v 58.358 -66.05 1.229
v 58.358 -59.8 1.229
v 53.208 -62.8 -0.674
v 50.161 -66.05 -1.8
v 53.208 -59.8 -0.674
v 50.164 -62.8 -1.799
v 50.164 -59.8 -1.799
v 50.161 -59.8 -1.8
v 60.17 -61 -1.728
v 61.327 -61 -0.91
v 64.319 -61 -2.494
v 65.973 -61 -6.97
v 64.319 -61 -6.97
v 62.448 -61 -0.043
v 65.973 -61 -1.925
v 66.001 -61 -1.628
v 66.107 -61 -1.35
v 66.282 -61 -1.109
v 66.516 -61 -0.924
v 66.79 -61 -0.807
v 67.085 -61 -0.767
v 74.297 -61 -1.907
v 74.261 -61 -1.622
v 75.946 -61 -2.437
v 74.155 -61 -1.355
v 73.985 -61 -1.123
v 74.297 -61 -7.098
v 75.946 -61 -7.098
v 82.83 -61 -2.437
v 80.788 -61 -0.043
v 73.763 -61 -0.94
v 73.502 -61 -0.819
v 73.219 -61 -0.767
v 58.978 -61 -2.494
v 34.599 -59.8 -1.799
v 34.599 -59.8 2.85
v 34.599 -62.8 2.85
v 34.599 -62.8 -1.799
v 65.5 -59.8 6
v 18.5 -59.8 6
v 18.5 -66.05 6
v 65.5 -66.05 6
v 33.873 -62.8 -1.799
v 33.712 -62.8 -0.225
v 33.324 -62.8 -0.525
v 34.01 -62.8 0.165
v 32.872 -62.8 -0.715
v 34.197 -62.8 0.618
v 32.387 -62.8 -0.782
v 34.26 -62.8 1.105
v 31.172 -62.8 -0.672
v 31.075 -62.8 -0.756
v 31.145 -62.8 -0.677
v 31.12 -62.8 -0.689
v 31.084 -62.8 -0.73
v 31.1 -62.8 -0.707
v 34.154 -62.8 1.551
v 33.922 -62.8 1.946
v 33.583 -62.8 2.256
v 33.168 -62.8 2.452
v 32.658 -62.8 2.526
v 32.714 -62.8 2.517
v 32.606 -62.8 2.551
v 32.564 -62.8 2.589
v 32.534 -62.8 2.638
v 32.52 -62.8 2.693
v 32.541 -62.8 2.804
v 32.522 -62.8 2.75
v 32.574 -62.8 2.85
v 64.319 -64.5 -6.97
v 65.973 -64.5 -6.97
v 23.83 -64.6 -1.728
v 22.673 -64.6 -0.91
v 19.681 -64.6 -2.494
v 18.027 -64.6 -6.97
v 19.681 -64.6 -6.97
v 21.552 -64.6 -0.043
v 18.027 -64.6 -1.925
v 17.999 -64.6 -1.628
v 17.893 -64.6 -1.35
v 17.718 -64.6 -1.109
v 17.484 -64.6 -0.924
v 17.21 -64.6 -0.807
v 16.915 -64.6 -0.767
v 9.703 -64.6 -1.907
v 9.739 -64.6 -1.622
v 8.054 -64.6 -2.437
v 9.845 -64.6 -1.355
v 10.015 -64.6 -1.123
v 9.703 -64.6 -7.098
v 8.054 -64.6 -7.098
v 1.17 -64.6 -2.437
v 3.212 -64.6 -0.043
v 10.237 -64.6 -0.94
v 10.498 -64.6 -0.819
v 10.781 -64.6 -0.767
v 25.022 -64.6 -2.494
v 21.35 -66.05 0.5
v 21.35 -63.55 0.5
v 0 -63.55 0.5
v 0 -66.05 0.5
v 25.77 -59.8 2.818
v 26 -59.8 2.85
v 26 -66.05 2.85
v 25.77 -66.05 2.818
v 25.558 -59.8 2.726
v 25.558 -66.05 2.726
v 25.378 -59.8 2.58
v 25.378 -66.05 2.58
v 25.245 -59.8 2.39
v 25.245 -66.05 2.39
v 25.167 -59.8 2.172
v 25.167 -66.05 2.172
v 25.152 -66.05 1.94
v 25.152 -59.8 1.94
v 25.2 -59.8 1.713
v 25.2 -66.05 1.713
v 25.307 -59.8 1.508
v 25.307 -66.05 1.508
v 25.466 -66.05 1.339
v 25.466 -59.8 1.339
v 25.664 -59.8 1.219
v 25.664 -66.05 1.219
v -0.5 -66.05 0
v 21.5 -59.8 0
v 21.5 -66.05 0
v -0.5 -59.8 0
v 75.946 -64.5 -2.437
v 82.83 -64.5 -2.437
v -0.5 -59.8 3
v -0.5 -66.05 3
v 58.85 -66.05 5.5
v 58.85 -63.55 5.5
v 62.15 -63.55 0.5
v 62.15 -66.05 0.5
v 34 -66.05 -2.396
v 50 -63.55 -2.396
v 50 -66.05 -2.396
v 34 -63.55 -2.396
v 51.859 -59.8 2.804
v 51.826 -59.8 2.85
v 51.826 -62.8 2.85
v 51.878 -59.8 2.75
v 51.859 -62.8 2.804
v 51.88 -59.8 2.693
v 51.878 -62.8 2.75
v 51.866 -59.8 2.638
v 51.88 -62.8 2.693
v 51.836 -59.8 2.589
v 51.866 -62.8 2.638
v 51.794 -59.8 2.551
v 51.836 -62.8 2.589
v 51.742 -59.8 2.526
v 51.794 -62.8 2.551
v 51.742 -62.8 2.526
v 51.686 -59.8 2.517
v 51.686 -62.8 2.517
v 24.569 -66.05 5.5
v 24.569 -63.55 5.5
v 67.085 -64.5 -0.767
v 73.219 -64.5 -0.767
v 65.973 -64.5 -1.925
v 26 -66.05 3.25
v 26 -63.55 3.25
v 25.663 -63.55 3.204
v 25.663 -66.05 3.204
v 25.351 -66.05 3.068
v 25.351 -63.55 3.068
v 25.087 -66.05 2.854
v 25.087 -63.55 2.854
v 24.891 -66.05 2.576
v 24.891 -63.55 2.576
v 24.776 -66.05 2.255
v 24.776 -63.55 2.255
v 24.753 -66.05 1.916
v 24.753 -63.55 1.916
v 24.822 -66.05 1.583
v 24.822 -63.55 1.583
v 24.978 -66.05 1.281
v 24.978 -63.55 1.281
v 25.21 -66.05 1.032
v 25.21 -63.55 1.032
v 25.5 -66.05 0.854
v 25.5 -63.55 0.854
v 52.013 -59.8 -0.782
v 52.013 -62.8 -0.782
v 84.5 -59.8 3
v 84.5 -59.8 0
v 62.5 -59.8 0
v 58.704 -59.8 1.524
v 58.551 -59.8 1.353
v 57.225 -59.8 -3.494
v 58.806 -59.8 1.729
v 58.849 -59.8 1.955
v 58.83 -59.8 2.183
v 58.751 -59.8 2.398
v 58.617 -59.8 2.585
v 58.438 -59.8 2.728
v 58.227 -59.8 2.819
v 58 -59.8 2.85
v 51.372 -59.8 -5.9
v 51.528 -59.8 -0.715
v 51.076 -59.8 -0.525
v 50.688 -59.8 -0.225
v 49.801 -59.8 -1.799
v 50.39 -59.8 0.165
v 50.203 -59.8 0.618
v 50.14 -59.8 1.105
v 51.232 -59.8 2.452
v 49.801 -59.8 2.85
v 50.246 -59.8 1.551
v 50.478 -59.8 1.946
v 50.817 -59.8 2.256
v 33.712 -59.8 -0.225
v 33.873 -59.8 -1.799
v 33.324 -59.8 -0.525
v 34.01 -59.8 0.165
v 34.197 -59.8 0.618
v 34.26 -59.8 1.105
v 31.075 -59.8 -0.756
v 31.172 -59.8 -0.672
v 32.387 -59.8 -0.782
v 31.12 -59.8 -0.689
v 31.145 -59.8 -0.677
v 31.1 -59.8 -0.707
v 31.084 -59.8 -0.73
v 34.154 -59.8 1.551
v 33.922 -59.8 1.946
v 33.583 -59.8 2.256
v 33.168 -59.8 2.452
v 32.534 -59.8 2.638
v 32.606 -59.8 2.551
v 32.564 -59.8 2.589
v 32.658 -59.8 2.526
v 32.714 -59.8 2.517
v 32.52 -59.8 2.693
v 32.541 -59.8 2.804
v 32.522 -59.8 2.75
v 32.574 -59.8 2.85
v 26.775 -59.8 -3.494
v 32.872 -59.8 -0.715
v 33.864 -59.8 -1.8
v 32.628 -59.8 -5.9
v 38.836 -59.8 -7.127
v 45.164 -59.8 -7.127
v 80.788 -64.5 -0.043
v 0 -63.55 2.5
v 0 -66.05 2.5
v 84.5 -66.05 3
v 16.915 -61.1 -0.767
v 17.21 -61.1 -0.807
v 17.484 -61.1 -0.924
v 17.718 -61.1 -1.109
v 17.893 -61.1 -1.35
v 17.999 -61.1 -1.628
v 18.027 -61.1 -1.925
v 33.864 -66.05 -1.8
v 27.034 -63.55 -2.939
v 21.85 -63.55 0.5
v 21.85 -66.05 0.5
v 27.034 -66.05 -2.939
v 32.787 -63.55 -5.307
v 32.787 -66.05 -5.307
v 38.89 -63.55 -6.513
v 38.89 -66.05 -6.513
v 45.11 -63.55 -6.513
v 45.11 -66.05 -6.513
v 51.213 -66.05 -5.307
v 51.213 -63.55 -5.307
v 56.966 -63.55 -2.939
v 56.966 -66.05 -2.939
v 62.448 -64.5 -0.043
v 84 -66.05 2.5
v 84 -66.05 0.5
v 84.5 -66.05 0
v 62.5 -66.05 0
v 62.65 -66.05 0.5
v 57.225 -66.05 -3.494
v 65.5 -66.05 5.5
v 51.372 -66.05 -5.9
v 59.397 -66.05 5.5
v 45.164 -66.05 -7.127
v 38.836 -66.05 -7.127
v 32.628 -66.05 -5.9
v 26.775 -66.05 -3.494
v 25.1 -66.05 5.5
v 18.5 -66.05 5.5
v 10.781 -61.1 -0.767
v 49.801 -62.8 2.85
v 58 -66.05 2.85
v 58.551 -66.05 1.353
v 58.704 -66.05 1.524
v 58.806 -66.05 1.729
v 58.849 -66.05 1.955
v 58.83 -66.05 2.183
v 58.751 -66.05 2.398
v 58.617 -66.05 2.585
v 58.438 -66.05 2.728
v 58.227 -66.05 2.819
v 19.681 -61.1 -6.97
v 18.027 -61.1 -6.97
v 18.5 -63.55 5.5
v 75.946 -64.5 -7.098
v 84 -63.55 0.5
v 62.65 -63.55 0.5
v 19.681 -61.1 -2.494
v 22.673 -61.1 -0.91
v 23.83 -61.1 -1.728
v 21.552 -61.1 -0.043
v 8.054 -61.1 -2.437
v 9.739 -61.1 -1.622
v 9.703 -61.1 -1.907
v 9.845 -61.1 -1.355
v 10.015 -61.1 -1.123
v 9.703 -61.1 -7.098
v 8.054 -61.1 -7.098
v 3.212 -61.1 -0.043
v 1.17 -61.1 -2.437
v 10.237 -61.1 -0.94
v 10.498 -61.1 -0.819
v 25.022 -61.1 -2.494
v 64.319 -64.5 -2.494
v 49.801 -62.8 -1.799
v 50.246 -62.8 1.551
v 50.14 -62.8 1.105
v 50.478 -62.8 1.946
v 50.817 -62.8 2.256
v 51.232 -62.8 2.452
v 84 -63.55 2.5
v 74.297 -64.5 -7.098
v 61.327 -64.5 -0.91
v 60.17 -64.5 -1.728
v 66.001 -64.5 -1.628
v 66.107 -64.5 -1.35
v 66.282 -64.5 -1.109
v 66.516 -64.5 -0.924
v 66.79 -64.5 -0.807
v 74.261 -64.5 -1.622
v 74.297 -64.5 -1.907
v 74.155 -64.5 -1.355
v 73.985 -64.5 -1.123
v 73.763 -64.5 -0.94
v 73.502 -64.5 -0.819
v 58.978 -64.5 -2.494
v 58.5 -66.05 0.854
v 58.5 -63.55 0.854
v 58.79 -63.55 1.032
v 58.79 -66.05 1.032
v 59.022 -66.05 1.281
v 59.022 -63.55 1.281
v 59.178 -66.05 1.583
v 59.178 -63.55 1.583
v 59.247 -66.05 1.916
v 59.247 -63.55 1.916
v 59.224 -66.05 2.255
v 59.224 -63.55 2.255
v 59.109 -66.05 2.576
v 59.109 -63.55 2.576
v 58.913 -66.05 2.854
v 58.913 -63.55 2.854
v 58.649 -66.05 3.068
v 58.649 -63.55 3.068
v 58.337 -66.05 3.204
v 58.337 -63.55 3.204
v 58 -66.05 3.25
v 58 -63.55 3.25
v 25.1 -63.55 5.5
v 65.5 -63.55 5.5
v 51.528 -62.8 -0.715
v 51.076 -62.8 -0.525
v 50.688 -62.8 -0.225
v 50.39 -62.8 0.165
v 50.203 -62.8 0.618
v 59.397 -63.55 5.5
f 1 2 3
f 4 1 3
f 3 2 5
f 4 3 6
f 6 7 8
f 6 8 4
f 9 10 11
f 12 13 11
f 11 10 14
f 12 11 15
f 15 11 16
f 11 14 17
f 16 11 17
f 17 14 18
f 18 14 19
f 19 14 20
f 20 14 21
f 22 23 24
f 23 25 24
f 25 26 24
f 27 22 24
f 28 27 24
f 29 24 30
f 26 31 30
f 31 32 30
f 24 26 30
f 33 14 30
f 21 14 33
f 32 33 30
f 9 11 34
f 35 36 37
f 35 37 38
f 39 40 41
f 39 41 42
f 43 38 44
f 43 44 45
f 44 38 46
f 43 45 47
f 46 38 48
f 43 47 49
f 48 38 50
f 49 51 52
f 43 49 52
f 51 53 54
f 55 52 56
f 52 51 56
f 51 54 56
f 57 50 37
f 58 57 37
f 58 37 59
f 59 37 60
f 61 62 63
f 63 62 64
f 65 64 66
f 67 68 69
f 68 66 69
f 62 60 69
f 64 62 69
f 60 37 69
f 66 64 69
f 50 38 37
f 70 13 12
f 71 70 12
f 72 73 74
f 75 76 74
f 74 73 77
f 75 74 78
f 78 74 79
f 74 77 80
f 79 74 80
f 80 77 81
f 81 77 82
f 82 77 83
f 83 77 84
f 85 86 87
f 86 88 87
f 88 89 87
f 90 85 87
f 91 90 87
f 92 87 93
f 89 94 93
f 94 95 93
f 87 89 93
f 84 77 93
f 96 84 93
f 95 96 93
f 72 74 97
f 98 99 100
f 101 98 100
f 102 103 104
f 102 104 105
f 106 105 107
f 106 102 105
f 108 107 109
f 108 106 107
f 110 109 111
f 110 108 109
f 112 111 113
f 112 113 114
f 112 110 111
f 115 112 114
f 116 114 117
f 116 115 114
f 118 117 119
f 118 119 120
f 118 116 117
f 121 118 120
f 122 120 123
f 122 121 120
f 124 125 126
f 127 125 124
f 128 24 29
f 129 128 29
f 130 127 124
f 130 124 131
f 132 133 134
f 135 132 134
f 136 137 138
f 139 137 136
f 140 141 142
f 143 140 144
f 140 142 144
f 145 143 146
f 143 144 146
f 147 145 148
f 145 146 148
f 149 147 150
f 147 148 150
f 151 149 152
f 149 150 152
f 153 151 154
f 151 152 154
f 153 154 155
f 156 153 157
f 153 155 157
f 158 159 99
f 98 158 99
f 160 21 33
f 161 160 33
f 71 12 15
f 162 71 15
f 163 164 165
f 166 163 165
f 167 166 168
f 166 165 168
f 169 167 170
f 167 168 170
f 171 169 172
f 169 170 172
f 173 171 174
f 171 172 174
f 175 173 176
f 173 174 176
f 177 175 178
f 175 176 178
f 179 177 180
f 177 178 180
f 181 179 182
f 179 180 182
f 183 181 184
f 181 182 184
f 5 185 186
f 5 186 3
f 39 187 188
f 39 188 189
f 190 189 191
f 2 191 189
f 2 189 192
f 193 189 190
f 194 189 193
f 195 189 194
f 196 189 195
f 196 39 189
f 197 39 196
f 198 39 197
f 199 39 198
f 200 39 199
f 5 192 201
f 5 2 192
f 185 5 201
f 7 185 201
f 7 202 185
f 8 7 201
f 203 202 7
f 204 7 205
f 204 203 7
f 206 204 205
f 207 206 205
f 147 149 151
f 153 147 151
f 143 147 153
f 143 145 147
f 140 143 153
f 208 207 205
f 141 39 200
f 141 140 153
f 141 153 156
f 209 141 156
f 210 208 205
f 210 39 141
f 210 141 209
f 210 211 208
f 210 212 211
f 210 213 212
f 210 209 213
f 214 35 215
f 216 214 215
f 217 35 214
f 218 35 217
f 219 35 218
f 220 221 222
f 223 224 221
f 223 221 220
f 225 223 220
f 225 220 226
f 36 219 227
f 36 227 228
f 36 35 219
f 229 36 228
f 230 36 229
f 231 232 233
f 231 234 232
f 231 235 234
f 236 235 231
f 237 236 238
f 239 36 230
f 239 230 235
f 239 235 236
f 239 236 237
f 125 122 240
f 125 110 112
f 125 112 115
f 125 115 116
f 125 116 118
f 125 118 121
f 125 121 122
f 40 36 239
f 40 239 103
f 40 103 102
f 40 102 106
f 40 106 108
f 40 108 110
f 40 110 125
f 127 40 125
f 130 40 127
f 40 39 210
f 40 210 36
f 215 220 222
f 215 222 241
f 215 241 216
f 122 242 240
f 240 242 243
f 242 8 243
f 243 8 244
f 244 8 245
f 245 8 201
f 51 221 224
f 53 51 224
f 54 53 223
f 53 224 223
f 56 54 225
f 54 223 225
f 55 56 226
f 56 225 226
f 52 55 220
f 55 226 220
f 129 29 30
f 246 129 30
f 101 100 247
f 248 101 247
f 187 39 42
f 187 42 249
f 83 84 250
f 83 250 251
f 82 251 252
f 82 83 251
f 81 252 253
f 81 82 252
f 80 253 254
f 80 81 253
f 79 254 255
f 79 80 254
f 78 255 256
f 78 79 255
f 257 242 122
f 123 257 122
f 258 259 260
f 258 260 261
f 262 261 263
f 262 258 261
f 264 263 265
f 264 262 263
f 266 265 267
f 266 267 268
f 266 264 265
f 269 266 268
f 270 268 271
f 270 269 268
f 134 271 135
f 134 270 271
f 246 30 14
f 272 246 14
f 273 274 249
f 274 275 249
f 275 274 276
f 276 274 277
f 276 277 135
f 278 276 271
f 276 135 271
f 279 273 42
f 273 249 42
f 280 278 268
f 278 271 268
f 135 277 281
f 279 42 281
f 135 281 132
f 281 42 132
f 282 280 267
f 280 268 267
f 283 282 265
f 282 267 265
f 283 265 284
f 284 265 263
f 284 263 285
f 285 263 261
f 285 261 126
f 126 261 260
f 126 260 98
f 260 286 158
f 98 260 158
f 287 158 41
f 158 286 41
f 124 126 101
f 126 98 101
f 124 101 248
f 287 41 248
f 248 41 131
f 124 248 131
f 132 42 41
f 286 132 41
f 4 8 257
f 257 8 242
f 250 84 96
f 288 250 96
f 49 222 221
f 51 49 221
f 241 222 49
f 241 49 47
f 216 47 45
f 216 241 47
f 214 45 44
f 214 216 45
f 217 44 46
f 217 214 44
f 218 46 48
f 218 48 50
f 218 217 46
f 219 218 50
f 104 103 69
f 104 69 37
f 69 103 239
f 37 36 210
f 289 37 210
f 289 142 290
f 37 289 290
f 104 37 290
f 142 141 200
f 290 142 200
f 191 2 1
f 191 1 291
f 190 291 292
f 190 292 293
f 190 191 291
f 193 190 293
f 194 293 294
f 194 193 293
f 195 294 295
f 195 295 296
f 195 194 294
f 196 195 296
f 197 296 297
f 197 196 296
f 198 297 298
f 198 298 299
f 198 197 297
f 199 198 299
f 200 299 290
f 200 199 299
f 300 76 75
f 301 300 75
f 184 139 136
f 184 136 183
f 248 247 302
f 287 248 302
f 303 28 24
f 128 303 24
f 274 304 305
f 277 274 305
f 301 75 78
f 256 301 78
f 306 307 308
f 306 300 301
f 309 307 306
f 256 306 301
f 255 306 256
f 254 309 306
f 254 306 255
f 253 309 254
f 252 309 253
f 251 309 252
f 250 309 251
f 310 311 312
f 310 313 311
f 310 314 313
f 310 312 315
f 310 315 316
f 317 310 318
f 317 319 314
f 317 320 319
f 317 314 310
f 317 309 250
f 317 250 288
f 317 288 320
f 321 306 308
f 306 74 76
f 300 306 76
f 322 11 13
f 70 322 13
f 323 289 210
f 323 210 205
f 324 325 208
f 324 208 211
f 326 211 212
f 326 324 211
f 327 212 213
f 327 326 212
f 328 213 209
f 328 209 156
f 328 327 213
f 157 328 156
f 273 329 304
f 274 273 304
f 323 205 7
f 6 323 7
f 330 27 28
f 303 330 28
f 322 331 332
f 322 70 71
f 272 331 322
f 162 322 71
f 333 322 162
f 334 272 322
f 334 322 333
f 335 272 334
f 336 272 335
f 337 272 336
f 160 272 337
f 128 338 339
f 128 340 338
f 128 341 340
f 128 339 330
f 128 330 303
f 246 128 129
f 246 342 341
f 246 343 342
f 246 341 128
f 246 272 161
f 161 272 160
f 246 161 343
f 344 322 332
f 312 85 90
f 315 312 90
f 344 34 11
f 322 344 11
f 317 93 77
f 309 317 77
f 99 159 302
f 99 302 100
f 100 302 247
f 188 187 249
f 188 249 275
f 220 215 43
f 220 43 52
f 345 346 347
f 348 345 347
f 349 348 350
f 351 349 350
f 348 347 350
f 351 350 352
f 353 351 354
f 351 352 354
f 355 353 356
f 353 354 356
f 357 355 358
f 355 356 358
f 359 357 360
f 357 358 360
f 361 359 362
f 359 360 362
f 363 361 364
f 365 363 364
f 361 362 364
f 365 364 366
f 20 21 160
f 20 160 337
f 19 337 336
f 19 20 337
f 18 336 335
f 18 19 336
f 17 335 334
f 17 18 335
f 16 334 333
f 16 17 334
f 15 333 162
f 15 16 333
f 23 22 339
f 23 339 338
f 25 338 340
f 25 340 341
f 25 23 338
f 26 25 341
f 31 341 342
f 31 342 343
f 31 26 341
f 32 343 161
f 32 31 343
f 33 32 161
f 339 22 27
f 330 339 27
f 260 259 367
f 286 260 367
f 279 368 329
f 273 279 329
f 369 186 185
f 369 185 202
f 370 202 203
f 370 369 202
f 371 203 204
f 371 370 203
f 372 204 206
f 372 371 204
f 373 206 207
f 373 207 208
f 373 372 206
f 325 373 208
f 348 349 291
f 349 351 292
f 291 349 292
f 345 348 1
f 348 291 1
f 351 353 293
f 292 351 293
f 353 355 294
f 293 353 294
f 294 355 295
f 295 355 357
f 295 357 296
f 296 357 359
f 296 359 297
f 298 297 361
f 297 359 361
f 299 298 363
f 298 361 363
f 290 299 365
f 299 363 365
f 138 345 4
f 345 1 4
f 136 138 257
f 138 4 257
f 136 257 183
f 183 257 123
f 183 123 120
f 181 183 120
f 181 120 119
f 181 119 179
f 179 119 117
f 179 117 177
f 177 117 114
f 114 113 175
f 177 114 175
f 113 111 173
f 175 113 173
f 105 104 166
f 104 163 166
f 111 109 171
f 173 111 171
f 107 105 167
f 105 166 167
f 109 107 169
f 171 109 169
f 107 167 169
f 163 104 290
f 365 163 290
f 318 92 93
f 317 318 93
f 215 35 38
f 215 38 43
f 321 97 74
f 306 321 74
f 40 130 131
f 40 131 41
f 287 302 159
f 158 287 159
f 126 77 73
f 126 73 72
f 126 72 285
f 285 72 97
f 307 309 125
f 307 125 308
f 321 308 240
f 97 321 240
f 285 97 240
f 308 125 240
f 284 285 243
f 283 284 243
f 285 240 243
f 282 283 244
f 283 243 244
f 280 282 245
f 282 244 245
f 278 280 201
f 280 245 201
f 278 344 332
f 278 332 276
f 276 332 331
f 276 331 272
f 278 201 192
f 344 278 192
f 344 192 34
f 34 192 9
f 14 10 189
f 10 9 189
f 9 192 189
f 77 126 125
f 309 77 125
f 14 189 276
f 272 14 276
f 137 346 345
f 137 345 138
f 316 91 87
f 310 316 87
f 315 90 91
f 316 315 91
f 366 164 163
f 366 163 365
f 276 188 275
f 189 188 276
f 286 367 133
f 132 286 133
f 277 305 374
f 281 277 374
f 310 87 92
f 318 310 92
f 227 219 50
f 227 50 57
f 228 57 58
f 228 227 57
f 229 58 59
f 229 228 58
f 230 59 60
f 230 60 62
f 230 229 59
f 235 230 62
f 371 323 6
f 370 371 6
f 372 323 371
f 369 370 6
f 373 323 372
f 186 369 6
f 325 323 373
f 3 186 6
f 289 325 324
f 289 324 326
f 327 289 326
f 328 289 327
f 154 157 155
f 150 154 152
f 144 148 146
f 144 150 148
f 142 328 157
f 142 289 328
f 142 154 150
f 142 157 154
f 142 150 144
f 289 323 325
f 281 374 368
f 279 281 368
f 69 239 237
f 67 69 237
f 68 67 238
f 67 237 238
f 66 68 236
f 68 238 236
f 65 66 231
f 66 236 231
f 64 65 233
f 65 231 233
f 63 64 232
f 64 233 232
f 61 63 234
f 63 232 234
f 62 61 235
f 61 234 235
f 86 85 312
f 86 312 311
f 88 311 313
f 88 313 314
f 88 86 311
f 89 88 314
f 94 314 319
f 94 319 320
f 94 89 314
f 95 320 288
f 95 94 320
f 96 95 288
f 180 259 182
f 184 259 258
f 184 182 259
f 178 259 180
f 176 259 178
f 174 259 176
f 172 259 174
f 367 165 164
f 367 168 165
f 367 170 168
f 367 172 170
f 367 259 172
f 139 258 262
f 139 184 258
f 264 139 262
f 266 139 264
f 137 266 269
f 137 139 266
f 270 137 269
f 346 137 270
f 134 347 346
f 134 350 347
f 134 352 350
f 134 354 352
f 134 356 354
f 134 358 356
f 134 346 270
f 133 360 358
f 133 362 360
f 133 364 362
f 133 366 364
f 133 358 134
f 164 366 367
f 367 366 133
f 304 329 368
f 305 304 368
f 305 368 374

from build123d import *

# Parameters (mm, degrees)
EXTRUDE068_DEPTH           = 3
EXTRUDE068_PLACEMENT_ANGLE = 180
EXTRUDE067_DEPTH           = 3
EXTRUDE027_DEPTH           = 3.5
EXTRUDE034_DEPTH           = 3.5
EXTRUDE034_PLACEMENT_ANGLE = 180
EXTRUDE020_DEPTH           = 2.5
EXTRUDE019_DEPTH           = 6.25
CUT036_PLACEMENT_ANGLE     = 90


with BuildPart() as extrude068:
    # Sketch040 → Extrude068 (new body)
    with BuildSketch(Plane.XZ):
        with BuildLine():
            Line((32.579475, 2.855954), (34.598949, 2.855954))
            Line((34.598949, 2.855954), (34.598949, -1.799177))
            Line((34.598949, -1.799177), (33.872559, -1.799177))
            Line((33.872559, -1.799177), (31.075473, -0.756428))
            ThreePointArc((31.172102, -0.672237), (31.109316, -0.697722), (31.075473, -0.756428))
            Line((32.386694, -0.781542), (31.172102, -0.672237))
            ThreePointArc((32.386694, -0.781542), (33.712242, -0.224592), (34.260406, 1.104614))
            ThreePointArc((34.260406, 1.104614), (33.763902, 2.113863), (32.714019, 2.517408))
            ThreePointArc((32.579475, 2.855954), (32.532862, 2.641421), (32.714019, 2.517408))
        make_face()
    extrude(amount=EXTRUDE068_DEPTH)


with BuildPart() as extrude068_1:
    # Extrude068 placement: moved
    add(extrude068.part.moved(Location((84.4, -62.8, 0))).rotate(Axis((84.4, -62.8, 0), (0, 0, 1)), EXTRUDE068_PLACEMENT_ANGLE))


with BuildPart() as extrude067:
    # Sketch040 → Extrude067 (new body)
    with BuildSketch(Plane.XZ):
        with BuildLine():
            Line((32.579475, 2.855954), (34.598949, 2.855954))
            Line((34.598949, 2.855954), (34.598949, -1.799177))
            Line((34.598949, -1.799177), (33.872559, -1.799177))
            Line((33.872559, -1.799177), (31.075473, -0.756428))
            ThreePointArc((31.172102, -0.672237), (31.109316, -0.697722), (31.075473, -0.756428))
            Line((32.386694, -0.781542), (31.172102, -0.672237))
            ThreePointArc((32.386694, -0.781542), (33.712242, -0.224592), (34.260406, 1.104614))
            ThreePointArc((34.260406, 1.104614), (33.763902, 2.113863), (32.714019, 2.517408))
            ThreePointArc((32.579475, 2.855954), (32.532862, 2.641421), (32.714019, 2.517408))
        make_face()
    extrude(amount=EXTRUDE067_DEPTH)


with BuildPart() as extrude067_1:
    # Extrude067 placement: moved
    add(extrude067.part.moved(Location((0, -59.8, 0))))


with BuildPart() as extrude027:
    # Sketch019 → Extrude027 (new body)
    with BuildSketch(Plane.XZ):
        with BuildLine():
            Line((82.710403, -2.436997), (80.667656, -0.042506))
            Line((80.667656, -0.042506), (62.164684, -0.042506))
            Line((62.164684, -0.042506), (58.594872, -2.493932))
            Line((58.594872, -2.493932), (64.198559, -2.493932))
            Line((64.198559, -2.493932), (64.198559, -6.97036))
            Line((64.198559, -6.97036), (65.852661, -6.97036))
            Line((65.852661, -6.97036), (65.852661, -1.924586))
            ThreePointArc((66.964828, -0.767347), (66.162314, -1.109134), (65.852661, -1.924586))
            Line((66.964828, -0.767347), (73.098848, -0.767347))
            ThreePointArc((74.177399, -1.907358), (73.865032, -1.122677), (73.098848, -0.767347))
            Line((74.177399, -1.907358), (74.177399, -7.098253))
            Line((74.177399, -7.098253), (75.826362, -7.098253))
            Line((75.826362, -7.098253), (75.826362, -2.436997))
            Line((75.826362, -2.436997), (82.710403, -2.436997))
        make_face()
    extrude(amount=EXTRUDE027_DEPTH)


with BuildPart() as extrude027_1:
    # Extrude027 placement: moved
    add(extrude027.part.moved(Location((0.12, -61, 0))))


with BuildPart() as extrude034:
    # Sketch019 → Extrude034 (new body)
    with BuildSketch(Plane.XZ):
        with BuildLine():
            Line((82.710403, -2.436997), (80.667656, -0.042506))
            Line((80.667656, -0.042506), (62.164684, -0.042506))
            Line((62.164684, -0.042506), (58.594872, -2.493932))
            Line((58.594872, -2.493932), (64.198559, -2.493932))
            Line((64.198559, -2.493932), (64.198559, -6.97036))
            Line((64.198559, -6.97036), (65.852661, -6.97036))
            Line((65.852661, -6.97036), (65.852661, -1.924586))
            ThreePointArc((66.964828, -0.767347), (66.162314, -1.109134), (65.852661, -1.924586))
            Line((66.964828, -0.767347), (73.098848, -0.767347))
            ThreePointArc((74.177399, -1.907358), (73.865032, -1.122677), (73.098848, -0.767347))
            Line((74.177399, -1.907358), (74.177399, -7.098253))
            Line((74.177399, -7.098253), (75.826362, -7.098253))
            Line((75.826362, -7.098253), (75.826362, -2.436997))
            Line((75.826362, -2.436997), (82.710403, -2.436997))
        make_face()
    extrude(amount=EXTRUDE034_DEPTH)


with BuildPart() as extrude034_1:
    # Extrude034 placement: moved
    add(extrude034.part.moved(Location((83.88, -64.6, 0))).rotate(Axis((83.88, -64.6, 0), (0, 0, 1)), EXTRUDE034_PLACEMENT_ANGLE))


with BuildPart() as extrude020:
    # Sketch012 → Extrude020 (new body)
    with BuildSketch(Plane.XY):
        with BuildLine():
            ThreePointArc((22.35, 0.5), (42.5, -6.665278), (62.65, 0.5))
            Line((59.35, 5.5), (62.65, 0.5))
            Line((25.6, 5.5), (59.35, 5.5))
            Line((22.35, 0.5), (25.6, 5.5))
        make_face()
        with BuildLine():
            Line((26.5, 3.25), (58.5, 3.25))
            ThreePointArc((59, 0.854356), (59.723633, 2.255387), (58.5, 3.25))
            Line((59, 0.854356), (50.5, -2.395644))
            Line((50.5, -2.395644), (34.5, -2.395644))
            Line((34.5, -2.395644), (26, 0.854356))
            ThreePointArc((26.5, 3.25), (25.276367, 2.255387), (26, 0.854356))
        make_face(mode=Mode.SUBTRACT)
        Polygon((21.85, 0.5), (0.5, 0.5), (0.5, 2.5), (19, 5.5), (25.06863, 5.5), align=None)
        Polygon((63.15, 0.5), (59.897327, 5.5), (66, 5.5), (84.5, 2.5), (84.5, 0.5), align=None)
    extrude(amount=EXTRUDE020_DEPTH)


with BuildPart() as extrude020_1:
    # Extrude020 placement: moved
    add(extrude020.part.moved(Location((0, 0, 3.75))))


with BuildPart() as seitentraeger:
    # Sketch011 → Extrude019 (new body)
    with BuildSketch(Plane.XY):
        with BuildLine():
            Line((22, 0), (0, 0))
            Line((0, 0), (0, 3))
            Line((0, 3), (19, 6))
            Line((19, 6), (66, 6))
            Line((66, 6), (85, 3))
            Line((85, 3), (85, 0))
            Line((85, 0), (63, 0))
            ThreePointArc((22, 0), (42.5, -7.28096), (63, 0))
        make_face()
        with BuildLine():
            Line((26.5, 2.85), (58.5, 2.85))
            ThreePointArc((58.857785, 1.228968), (59.330023, 2.183198), (58.5, 2.85))
            Line((58.857785, 1.228968), (50.661382, -1.8))
            Line((50.661382, -1.8), (34.364024, -1.8))
            Line((34.364024, -1.8), (26.164024, 1.219218))
            ThreePointArc((26.5, 2.85), (25.667484, 2.171516), (26.164024, 1.219218))
        make_face(mode=Mode.SUBTRACT)
    extrude(amount=EXTRUDE019_DEPTH)

    # Cut036: cut Extrude020
    add(extrude020_1.part, mode=Mode.SUBTRACT)


with BuildPart() as seitentraeger_1:
    # Cut036 placement: moved
    add(seitentraeger.part.moved(Location((-0.5, -59.8, 0))).rotate(Axis((-0.5, -59.8, 0), (1, 0, 0)), CUT036_PLACEMENT_ANGLE))

    # Fusion034: union Extrude027, Extrude034
    add(extrude027_1.part)
    add(extrude034_1.part)

    # Fusion058: union Extrude068, Extrude067
    add(extrude068_1.part)
    add(extrude067_1.part)


solid = seitentraeger_1.part
